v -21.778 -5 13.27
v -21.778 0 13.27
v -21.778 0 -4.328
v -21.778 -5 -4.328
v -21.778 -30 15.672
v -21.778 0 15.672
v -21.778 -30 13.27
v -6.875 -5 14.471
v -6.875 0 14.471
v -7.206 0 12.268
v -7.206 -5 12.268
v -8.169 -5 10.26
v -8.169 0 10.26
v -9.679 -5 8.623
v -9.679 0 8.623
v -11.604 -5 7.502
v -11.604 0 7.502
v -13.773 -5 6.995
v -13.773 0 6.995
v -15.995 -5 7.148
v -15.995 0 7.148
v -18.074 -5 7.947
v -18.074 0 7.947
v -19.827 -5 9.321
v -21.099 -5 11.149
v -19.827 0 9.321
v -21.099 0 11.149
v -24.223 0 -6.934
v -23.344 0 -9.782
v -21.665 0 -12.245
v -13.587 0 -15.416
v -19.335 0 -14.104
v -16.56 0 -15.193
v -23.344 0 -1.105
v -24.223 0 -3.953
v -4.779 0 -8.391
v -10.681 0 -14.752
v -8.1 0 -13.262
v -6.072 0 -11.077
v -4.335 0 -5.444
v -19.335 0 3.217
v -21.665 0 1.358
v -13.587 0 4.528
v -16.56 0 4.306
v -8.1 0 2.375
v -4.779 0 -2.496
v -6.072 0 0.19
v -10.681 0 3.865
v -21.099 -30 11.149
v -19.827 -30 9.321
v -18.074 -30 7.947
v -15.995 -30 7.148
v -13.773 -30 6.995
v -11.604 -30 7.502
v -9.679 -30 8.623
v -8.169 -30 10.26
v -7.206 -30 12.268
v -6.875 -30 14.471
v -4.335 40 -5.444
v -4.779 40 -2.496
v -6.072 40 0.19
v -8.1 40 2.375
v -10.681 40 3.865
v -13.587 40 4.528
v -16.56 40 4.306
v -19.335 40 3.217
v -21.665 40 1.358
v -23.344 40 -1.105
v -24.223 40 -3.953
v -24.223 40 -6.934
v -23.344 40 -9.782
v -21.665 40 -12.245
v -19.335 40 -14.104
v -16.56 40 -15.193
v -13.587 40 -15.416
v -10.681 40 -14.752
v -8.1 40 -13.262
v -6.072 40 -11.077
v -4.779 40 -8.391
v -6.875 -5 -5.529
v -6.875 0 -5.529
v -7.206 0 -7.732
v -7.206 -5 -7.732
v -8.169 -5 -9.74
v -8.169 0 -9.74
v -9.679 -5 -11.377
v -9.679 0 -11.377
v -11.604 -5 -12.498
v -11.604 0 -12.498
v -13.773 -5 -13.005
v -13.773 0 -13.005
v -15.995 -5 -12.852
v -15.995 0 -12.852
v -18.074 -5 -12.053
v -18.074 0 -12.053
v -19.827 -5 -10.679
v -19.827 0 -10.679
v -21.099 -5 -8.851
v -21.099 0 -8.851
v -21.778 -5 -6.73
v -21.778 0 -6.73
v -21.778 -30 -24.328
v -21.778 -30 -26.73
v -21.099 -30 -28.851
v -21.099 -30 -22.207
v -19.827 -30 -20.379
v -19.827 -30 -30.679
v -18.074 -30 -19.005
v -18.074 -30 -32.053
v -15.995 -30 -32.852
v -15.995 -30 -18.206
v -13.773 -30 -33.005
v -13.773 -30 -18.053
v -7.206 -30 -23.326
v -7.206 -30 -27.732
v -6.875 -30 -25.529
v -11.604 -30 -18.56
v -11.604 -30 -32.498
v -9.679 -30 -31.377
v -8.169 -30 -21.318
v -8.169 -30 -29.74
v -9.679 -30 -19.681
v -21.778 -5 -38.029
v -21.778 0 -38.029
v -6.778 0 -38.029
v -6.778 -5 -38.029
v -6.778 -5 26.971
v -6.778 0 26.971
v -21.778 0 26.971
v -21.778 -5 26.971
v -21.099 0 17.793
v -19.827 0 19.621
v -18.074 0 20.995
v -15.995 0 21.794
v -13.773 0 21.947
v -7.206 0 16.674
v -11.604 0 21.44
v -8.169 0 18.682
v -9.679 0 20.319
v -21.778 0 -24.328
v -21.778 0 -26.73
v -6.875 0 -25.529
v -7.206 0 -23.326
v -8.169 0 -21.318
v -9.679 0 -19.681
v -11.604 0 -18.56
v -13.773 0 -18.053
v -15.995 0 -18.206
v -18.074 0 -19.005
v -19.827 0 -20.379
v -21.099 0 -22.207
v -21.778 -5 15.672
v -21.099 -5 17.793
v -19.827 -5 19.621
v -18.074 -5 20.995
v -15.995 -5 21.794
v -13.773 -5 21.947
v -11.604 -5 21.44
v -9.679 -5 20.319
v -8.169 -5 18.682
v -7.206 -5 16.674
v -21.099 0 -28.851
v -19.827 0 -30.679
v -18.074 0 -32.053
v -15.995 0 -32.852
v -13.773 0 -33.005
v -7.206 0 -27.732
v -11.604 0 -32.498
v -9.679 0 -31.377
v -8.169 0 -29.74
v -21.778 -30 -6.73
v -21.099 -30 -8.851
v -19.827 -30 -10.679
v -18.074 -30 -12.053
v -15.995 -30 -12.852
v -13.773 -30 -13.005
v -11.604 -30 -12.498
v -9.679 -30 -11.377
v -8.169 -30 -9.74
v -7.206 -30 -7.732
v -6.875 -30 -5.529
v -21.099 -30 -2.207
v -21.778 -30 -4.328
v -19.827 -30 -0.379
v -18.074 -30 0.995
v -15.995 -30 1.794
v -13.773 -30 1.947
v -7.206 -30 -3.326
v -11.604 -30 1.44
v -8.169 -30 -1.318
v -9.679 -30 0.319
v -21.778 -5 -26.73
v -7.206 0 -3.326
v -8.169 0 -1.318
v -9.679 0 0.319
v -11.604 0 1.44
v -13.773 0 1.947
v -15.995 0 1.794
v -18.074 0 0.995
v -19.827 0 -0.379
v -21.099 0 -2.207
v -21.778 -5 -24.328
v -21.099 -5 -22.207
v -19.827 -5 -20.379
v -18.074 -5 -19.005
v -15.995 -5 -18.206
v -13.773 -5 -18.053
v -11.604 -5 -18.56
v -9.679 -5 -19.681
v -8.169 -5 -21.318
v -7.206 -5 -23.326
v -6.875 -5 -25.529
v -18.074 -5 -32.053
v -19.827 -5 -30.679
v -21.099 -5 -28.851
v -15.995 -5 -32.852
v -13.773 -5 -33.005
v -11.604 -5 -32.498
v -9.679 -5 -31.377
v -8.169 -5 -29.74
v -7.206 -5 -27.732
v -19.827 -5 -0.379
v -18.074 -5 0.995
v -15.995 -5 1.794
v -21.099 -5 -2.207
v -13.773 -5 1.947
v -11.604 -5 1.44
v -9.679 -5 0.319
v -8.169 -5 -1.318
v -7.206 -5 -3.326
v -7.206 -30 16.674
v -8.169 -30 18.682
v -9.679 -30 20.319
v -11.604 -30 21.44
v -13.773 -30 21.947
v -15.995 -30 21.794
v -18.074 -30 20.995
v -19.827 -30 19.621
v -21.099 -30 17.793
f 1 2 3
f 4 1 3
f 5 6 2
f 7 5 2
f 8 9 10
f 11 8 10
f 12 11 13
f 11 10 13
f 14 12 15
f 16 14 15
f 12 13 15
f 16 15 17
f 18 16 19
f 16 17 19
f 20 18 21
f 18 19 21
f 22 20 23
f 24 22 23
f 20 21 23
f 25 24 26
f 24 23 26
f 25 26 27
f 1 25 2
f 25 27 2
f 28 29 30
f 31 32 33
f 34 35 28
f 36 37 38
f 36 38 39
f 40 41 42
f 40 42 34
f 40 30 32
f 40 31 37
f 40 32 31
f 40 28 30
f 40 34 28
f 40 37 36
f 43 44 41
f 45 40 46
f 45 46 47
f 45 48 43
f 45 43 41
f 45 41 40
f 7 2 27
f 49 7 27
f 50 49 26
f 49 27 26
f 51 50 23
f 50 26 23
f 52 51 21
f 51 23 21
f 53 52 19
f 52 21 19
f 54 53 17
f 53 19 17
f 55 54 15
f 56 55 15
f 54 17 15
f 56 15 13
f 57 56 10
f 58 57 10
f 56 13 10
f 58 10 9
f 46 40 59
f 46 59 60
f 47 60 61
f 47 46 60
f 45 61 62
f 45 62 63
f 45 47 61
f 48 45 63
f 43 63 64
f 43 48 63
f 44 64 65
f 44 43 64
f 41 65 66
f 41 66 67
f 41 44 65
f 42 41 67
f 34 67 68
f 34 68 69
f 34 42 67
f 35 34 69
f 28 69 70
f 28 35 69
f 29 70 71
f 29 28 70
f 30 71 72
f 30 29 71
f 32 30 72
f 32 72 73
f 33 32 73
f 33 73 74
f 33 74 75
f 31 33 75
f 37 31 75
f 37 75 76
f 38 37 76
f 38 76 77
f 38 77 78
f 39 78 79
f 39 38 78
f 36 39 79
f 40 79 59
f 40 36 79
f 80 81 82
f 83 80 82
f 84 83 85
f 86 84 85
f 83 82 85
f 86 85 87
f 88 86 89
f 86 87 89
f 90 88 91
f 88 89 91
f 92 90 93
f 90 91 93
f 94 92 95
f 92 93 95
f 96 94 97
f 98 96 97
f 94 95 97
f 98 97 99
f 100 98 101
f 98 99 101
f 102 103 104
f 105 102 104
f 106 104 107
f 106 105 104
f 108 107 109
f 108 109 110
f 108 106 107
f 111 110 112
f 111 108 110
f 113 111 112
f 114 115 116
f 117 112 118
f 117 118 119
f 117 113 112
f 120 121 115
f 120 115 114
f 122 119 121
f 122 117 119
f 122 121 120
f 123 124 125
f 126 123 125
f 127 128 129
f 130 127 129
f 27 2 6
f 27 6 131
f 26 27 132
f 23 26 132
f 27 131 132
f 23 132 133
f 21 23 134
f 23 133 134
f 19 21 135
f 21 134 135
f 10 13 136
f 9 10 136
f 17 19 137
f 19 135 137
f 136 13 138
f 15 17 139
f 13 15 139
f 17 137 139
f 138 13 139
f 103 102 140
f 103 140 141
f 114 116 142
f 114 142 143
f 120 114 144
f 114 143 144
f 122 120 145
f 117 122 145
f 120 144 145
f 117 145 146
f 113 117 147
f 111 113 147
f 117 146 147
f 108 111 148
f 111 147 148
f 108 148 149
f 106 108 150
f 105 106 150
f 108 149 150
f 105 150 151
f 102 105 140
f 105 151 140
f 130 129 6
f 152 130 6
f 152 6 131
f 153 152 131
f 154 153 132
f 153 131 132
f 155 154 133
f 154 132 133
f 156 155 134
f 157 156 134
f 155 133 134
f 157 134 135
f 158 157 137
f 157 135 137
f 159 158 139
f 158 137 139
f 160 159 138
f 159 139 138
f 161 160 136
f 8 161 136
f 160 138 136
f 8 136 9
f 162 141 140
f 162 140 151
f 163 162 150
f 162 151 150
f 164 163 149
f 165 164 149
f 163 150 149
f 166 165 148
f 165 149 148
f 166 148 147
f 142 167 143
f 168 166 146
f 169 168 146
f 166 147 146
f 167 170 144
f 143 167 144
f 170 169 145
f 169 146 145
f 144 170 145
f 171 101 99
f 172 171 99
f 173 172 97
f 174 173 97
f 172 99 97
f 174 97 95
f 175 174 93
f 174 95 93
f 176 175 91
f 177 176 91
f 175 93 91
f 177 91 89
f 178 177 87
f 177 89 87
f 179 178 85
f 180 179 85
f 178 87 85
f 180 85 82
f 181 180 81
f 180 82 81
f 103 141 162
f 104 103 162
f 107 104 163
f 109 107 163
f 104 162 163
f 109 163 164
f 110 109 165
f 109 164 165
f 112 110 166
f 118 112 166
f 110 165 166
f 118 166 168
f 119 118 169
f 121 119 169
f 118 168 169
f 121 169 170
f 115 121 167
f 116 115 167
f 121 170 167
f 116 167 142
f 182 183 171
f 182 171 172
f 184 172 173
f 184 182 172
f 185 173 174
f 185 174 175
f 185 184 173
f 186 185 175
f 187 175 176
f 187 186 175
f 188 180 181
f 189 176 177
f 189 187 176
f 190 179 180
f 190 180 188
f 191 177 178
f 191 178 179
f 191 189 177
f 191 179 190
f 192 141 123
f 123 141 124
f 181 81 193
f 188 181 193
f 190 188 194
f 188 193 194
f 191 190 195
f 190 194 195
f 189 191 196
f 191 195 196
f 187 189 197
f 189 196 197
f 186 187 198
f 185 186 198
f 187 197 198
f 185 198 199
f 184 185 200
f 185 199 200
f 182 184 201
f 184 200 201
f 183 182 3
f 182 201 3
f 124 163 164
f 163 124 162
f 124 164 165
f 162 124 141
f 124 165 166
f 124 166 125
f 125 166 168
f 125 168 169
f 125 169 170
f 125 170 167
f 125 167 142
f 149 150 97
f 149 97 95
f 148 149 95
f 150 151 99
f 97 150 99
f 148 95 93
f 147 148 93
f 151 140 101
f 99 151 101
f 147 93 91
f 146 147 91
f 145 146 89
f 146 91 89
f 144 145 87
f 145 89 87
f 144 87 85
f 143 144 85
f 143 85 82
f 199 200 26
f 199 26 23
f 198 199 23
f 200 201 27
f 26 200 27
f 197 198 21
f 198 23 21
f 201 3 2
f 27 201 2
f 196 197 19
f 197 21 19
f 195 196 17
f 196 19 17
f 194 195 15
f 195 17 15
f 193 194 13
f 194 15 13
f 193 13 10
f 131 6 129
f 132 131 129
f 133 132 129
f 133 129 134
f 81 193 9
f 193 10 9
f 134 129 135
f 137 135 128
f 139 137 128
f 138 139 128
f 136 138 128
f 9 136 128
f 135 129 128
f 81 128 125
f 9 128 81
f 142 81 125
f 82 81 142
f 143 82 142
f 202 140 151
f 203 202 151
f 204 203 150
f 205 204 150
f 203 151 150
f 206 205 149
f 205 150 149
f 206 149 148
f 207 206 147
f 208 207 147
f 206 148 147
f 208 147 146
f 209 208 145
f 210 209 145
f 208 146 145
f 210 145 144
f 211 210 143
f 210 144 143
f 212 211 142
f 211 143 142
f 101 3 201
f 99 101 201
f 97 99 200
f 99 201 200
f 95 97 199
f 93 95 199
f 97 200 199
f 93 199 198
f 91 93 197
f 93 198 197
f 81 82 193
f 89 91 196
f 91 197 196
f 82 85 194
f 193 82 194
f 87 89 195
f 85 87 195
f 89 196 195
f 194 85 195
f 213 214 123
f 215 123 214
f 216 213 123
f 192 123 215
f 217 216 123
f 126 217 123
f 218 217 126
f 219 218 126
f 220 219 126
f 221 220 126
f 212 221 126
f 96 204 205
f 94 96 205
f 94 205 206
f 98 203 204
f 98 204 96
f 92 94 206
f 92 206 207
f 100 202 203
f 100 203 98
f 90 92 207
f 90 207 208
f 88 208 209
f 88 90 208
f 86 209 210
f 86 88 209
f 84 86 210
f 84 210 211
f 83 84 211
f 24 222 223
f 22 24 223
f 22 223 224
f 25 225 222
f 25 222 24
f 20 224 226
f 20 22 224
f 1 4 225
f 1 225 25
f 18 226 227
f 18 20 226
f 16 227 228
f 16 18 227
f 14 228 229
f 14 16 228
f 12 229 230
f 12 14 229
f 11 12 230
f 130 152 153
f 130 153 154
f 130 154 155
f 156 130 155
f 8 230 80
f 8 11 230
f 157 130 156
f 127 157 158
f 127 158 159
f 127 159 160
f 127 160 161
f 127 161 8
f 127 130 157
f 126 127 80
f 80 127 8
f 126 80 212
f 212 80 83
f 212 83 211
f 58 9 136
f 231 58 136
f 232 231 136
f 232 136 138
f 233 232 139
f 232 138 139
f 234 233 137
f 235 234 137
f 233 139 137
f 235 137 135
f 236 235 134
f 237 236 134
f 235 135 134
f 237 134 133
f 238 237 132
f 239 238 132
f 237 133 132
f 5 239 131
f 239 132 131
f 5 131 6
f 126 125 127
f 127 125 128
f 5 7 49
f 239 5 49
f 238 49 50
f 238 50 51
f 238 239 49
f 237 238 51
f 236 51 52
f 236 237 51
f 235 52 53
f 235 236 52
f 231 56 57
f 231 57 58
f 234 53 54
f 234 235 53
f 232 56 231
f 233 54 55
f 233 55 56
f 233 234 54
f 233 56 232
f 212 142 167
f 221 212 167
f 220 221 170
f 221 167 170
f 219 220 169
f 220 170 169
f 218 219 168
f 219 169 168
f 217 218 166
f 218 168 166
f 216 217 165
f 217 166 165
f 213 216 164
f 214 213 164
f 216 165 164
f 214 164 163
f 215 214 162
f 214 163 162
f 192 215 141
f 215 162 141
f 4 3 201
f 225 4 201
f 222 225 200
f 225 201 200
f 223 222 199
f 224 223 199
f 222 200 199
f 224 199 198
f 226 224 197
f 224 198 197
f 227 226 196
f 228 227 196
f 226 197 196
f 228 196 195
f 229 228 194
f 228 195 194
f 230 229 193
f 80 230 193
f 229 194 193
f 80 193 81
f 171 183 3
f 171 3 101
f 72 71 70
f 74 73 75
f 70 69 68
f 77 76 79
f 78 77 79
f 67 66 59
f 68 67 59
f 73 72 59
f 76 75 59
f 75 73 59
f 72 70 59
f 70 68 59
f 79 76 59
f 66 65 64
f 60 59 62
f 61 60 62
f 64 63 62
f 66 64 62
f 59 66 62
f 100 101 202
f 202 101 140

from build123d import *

# Parameters (mm, degrees)
F1_DEPTH = 5
F2_DEPTH = 30
F3_R     = 10
F4_DEPTH = 40


with BuildPart() as f1:
    # F0 (on Front) → F1 (new body)
    with BuildSketch(Plane.XZ):
        with BuildLine():
            Line((-6.7781025575, 26.9709620651), (-21.7781025575, 26.9709620651))
            Line((-21.7781025575, 26.9709620651), (-21.7781025575, 15.6716265028))
            ThreePointArc((-21.7781025575, 15.6716265028), (-13.7725553731, 21.9467404224), (-6.874832678, 14.4709620651))
            ThreePointArc((-6.874832678, 14.4709620651), (-13.7725553731, 6.9951837077), (-21.7781025575, 13.2702976273))
            Line((-21.7781025575, 13.2702976273), (-21.7781025575, -4.3283788873))
            ThreePointArc((-21.7781025575, -4.3283788873), (-13.7725572204, 1.9467406416), (-6.8748318039, -5.5290379349))
            ThreePointArc((-6.8748318039, -5.5290379349), (-13.7725572204, -13.0048165115), (-21.7781025575, -6.7296969826))
            Line((-21.7781025575, -6.7296969826), (-21.7781025575, -24.3283788873))
            ThreePointArc((-21.7781025575, -24.3283788873), (-13.7725572204, -18.0532593584), (-6.8748318039, -25.5290379349))
            ThreePointArc((-6.8748318039, -25.5290379349), (-13.7725572204, -33.0048165115), (-21.7781025575, -26.7296969826))
            Line((-21.7781025575, -26.7296969826), (-21.7781025575, -38.0290379349))
            Line((-21.7781025575, -38.0290379349), (-6.7781025575, -38.0290379349))
            Line((-6.7781025575, -38.0290379349), (-6.7781025575, 26.9709620651))
        make_face()
    extrude(amount=F1_DEPTH)


with BuildPart() as f2:
    # F0 (on Front) → F2 (new body)
    with BuildSketch(Plane.XZ):
        with BuildLine():
            ThreePointArc((-6.874832678, 14.4709620651), (-13.7725553731, 21.9467404224), (-21.7781025575, 15.6716265028))
            Line((-21.7781025575, 15.6716265028), (-21.7781025575, 13.2702976273))
            ThreePointArc((-21.7781025575, 13.2702976273), (-13.7725553731, 6.9951837077), (-6.874832678, 14.4709620651))
        make_face()
    extrude(amount=F2_DEPTH)


with BuildPart() as f2b:
    # F0 (on Front) → F2, piece 2 (new body)
    with BuildSketch(Plane.XZ):
        with BuildLine():
            ThreePointArc((-6.8748318039, -5.5290379349), (-13.7725572204, 1.9467406416), (-21.7781025575, -4.3283788873))
            Line((-21.7781025575, -4.3283788873), (-21.7781025575, -6.7296969826))
            ThreePointArc((-21.7781025575, -6.7296969826), (-13.7725572204, -13.0048165115), (-6.8748318039, -5.5290379349))
        make_face()
    extrude(amount=F2_DEPTH)


with BuildPart() as f2c:
    # F0 (on Front) → F2, piece 3 (new body)
    with BuildSketch(Plane.XZ):
        with BuildLine():
            Line((-21.7781025575, -24.3283788873), (-21.7781025575, -26.7296969826))
            ThreePointArc((-21.7781025575, -26.7296969826), (-13.7725572204, -33.0048165115), (-6.8748318039, -25.5290379349))
            ThreePointArc((-6.8748318039, -25.5290379349), (-13.7725572204, -18.0532593584), (-21.7781025575, -24.3283788873))
        make_face()
    extrude(amount=F2_DEPTH)


with BuildPart() as f4:
    # F3 (on Front) → F4 (new body)
    with BuildSketch(Plane.XZ):
        with Locations((-14.3346777186, -5.443548318)):
            Circle(F3_R)
    extrude(amount=-F4_DEPTH)


solid = Compound([f1.part, f2.part, f2b.part, f2c.part, f4.part])
